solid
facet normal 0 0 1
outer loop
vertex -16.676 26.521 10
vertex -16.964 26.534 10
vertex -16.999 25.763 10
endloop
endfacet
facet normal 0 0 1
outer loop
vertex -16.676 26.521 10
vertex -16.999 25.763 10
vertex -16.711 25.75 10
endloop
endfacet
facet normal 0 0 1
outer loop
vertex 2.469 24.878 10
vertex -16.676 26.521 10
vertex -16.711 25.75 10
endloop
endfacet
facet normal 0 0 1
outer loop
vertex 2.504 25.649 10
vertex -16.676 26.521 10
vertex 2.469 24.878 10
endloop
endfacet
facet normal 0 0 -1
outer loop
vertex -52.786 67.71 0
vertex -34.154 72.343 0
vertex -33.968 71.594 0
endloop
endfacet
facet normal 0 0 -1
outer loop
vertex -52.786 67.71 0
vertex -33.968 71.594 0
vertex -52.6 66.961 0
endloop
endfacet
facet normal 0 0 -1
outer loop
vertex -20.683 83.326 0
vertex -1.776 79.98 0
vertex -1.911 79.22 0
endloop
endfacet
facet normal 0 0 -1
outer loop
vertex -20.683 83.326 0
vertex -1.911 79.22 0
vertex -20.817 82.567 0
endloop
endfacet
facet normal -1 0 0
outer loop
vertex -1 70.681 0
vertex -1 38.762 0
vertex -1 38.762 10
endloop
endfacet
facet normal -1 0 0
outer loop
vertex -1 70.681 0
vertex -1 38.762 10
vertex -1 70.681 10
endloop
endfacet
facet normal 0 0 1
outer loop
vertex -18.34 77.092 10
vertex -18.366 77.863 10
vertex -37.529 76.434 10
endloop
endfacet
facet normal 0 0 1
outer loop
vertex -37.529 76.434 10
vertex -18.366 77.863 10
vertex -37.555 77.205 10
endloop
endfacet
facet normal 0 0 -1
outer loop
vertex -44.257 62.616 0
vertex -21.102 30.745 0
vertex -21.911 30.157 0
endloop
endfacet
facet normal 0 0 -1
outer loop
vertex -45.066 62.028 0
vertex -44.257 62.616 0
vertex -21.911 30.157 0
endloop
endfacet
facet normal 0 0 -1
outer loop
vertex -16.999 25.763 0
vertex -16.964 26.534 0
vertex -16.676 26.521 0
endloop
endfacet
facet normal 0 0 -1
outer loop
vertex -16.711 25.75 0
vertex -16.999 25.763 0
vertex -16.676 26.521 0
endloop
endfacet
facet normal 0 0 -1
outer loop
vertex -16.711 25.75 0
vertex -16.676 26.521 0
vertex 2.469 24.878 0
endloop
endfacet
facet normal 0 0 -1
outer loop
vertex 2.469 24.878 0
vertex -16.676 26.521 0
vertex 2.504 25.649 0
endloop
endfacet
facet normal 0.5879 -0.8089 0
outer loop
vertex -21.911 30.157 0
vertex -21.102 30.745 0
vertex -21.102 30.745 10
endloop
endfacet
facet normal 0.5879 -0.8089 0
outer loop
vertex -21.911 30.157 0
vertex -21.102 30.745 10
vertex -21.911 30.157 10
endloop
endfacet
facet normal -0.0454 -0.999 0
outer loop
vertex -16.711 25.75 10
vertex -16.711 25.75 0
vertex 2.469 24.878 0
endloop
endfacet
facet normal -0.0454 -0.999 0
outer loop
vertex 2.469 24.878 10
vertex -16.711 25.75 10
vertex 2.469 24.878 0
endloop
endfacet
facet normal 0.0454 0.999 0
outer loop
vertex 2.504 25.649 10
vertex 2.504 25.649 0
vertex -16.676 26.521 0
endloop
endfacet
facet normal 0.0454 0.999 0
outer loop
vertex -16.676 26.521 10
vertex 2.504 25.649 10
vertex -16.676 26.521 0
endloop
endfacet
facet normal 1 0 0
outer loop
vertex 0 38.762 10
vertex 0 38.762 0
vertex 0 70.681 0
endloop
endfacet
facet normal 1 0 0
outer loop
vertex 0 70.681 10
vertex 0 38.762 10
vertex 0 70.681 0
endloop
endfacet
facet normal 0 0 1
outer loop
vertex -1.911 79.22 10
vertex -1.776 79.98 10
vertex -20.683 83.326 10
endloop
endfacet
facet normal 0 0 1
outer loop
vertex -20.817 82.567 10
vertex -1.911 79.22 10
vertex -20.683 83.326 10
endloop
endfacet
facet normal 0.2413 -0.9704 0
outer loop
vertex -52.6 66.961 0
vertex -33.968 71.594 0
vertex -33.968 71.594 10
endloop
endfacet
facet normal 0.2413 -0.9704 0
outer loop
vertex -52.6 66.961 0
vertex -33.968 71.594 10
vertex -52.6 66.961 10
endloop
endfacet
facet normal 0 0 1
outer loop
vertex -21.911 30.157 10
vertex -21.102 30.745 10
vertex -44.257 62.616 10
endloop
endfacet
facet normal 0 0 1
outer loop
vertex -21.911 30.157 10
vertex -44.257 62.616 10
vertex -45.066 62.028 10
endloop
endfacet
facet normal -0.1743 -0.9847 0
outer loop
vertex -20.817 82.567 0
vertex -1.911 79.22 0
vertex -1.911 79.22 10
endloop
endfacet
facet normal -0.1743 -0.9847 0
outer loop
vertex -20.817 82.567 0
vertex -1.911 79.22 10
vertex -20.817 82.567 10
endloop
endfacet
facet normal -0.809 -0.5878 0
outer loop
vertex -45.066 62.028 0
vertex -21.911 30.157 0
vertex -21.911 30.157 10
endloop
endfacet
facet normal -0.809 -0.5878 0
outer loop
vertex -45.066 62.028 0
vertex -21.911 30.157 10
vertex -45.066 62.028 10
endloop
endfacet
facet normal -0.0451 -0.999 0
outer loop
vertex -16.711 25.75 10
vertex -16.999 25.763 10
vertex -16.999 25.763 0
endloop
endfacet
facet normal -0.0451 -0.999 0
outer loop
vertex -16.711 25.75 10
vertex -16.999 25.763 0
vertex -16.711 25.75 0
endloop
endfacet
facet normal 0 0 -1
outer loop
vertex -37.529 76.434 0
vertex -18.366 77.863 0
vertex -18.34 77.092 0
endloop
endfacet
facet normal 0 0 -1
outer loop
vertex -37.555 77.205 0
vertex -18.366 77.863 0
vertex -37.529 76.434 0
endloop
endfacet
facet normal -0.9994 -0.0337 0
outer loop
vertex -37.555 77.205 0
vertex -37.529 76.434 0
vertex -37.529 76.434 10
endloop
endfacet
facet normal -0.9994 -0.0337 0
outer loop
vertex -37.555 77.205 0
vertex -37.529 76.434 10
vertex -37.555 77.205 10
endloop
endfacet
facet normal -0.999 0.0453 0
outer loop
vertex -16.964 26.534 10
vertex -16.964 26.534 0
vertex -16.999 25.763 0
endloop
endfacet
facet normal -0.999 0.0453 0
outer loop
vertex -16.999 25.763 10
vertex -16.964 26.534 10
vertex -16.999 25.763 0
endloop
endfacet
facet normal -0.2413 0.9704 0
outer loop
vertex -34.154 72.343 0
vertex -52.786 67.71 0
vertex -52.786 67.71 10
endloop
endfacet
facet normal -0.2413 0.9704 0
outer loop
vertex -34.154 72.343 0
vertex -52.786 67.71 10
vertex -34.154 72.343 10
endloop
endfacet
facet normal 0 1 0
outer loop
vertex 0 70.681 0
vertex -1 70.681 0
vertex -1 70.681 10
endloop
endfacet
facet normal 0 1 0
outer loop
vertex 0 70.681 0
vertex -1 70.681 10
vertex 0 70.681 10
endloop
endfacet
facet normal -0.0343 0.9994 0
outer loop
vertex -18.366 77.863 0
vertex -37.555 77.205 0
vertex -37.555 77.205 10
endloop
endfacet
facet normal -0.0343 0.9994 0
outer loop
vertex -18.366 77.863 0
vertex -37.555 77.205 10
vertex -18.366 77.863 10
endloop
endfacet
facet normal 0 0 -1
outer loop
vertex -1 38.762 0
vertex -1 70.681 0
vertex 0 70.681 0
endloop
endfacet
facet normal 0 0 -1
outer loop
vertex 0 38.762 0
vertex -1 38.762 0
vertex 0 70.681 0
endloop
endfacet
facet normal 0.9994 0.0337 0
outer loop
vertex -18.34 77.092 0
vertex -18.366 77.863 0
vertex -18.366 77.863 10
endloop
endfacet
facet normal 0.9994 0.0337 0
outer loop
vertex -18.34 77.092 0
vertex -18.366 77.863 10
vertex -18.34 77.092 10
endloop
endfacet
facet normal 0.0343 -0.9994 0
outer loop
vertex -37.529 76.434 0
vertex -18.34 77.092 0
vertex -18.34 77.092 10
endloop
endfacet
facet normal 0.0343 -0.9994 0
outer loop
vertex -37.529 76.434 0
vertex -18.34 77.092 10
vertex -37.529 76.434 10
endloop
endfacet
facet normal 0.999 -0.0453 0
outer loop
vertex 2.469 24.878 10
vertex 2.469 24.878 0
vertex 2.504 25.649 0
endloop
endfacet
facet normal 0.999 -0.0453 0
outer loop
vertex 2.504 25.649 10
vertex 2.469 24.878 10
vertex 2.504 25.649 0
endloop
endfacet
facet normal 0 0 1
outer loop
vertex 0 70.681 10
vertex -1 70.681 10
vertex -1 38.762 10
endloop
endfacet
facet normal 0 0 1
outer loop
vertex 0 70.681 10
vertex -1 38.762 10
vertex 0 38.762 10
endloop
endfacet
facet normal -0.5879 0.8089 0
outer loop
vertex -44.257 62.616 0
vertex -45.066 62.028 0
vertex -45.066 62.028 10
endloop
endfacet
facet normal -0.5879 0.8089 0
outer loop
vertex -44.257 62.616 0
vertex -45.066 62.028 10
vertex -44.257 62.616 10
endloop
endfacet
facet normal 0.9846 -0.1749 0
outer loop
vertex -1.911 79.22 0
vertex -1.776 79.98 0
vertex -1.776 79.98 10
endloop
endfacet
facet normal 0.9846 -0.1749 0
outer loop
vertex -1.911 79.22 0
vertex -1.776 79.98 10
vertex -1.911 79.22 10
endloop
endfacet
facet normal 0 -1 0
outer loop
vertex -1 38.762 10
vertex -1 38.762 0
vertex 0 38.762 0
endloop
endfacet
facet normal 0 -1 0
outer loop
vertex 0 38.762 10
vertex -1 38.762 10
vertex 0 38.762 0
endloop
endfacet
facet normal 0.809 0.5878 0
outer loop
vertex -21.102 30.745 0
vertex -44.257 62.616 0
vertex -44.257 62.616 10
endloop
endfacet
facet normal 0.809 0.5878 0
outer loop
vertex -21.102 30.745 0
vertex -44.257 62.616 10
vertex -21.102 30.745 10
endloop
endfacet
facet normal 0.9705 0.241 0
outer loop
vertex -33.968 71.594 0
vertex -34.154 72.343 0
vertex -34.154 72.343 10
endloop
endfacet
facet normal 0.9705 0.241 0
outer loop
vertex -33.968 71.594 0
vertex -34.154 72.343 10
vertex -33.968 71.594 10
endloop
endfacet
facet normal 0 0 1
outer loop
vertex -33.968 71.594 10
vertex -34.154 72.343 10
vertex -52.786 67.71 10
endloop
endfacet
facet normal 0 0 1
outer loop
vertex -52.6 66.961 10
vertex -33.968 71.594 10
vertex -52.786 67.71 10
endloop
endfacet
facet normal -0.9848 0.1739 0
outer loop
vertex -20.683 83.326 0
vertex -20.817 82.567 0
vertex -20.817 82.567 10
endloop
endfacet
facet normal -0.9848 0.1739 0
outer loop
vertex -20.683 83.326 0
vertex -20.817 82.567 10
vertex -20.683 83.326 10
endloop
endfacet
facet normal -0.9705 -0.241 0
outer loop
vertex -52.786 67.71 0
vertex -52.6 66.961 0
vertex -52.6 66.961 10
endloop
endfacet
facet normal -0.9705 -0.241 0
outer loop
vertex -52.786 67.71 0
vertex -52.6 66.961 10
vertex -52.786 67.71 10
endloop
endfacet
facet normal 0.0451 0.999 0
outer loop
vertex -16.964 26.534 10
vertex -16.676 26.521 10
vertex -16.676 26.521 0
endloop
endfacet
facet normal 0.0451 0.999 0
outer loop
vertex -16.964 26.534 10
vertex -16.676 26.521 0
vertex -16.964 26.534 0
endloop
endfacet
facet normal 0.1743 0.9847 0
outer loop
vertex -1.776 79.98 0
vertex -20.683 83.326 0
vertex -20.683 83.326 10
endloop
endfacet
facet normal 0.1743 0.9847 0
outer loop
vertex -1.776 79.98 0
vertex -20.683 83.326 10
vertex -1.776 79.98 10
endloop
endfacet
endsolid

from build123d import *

# Parameters (mm, degrees)
LADDER_REFERENCE_DEPTH   = 10
LADDER_REFERENCE_2_DEPTH = 10
LADDER_REFERENCE_3_DEPTH = 10
LADDER_REFERENCE_4_DEPTH = 10
LADDER_REFERENCE_5_DEPTH = 10
SKETCH4_W                = 1
SKETCH4_H                = 31.918650031
LADDER_REFERENCE_6_DEPTH = 10


with BuildPart() as part:
    # Sketch4 → ladder reference (new body)
    with BuildSketch(Plane.XY):
        Polygon((-34.153795821, 72.343059315), (-33.967611208, 71.594259041), (-52.600277425, 66.961360418), (-52.786462038, 67.710160692), align=None)
    extrude(amount=LADDER_REFERENCE_DEPTH)


with BuildPart() as body_2:
    # Sketch4 → ladder reference 2 (new body)
    with BuildSketch(Plane.XY):
        Polygon((-18.366485657, 77.863163335), (-18.340053955, 77.092016187), (-37.528785497, 76.434306652), (-37.555217199, 77.205453801), align=None)
    extrude(amount=LADDER_REFERENCE_2_DEPTH)


with BuildPart() as body_3:
    # Sketch4 → ladder reference 3 (new body)
    with BuildSketch(Plane.XY):
        Polygon((-1.776471938, 79.980273489), (-1.91094834, 79.220482296), (-20.81710556, 82.566706912), (-20.682629158, 83.326498105), align=None)
    extrude(amount=LADDER_REFERENCE_3_DEPTH)


with BuildPart() as body_4:
    # Sketch4 → ladder reference 4 (new body)
    with BuildSketch(Plane.XY):
        Polygon((-16.710861276, 25.750208439), (2.469306063, 24.877751658), (2.50436792, 25.648554633), (-16.675799419, 26.521011414), (-16.963801619, 26.534111898), (-16.998863476, 25.763308923), align=None)
    extrude(amount=LADDER_REFERENCE_4_DEPTH)


with BuildPart() as body_5:
    # Sketch4 → ladder reference 5 (new body)
    with BuildSketch(Plane.XY):
        Polygon((-45.066178843, 62.028273785), (-44.257161849, 62.616059037), (-21.101625762, 30.745197807), (-21.910642756, 30.157412555), align=None)
    extrude(amount=LADDER_REFERENCE_5_DEPTH)


with BuildPart() as body_6:
    # Sketch4 → ladder reference 6 (new body)
    with BuildSketch(Plane.XY):
        with Locations((-0.5, 54.721732316)):
            Rectangle(SKETCH4_W, SKETCH4_H)
    extrude(amount=LADDER_REFERENCE_6_DEPTH)


solid = Compound([part.part, body_2.part, body_3.part, body_4.part, body_5.part, body_6.part])
